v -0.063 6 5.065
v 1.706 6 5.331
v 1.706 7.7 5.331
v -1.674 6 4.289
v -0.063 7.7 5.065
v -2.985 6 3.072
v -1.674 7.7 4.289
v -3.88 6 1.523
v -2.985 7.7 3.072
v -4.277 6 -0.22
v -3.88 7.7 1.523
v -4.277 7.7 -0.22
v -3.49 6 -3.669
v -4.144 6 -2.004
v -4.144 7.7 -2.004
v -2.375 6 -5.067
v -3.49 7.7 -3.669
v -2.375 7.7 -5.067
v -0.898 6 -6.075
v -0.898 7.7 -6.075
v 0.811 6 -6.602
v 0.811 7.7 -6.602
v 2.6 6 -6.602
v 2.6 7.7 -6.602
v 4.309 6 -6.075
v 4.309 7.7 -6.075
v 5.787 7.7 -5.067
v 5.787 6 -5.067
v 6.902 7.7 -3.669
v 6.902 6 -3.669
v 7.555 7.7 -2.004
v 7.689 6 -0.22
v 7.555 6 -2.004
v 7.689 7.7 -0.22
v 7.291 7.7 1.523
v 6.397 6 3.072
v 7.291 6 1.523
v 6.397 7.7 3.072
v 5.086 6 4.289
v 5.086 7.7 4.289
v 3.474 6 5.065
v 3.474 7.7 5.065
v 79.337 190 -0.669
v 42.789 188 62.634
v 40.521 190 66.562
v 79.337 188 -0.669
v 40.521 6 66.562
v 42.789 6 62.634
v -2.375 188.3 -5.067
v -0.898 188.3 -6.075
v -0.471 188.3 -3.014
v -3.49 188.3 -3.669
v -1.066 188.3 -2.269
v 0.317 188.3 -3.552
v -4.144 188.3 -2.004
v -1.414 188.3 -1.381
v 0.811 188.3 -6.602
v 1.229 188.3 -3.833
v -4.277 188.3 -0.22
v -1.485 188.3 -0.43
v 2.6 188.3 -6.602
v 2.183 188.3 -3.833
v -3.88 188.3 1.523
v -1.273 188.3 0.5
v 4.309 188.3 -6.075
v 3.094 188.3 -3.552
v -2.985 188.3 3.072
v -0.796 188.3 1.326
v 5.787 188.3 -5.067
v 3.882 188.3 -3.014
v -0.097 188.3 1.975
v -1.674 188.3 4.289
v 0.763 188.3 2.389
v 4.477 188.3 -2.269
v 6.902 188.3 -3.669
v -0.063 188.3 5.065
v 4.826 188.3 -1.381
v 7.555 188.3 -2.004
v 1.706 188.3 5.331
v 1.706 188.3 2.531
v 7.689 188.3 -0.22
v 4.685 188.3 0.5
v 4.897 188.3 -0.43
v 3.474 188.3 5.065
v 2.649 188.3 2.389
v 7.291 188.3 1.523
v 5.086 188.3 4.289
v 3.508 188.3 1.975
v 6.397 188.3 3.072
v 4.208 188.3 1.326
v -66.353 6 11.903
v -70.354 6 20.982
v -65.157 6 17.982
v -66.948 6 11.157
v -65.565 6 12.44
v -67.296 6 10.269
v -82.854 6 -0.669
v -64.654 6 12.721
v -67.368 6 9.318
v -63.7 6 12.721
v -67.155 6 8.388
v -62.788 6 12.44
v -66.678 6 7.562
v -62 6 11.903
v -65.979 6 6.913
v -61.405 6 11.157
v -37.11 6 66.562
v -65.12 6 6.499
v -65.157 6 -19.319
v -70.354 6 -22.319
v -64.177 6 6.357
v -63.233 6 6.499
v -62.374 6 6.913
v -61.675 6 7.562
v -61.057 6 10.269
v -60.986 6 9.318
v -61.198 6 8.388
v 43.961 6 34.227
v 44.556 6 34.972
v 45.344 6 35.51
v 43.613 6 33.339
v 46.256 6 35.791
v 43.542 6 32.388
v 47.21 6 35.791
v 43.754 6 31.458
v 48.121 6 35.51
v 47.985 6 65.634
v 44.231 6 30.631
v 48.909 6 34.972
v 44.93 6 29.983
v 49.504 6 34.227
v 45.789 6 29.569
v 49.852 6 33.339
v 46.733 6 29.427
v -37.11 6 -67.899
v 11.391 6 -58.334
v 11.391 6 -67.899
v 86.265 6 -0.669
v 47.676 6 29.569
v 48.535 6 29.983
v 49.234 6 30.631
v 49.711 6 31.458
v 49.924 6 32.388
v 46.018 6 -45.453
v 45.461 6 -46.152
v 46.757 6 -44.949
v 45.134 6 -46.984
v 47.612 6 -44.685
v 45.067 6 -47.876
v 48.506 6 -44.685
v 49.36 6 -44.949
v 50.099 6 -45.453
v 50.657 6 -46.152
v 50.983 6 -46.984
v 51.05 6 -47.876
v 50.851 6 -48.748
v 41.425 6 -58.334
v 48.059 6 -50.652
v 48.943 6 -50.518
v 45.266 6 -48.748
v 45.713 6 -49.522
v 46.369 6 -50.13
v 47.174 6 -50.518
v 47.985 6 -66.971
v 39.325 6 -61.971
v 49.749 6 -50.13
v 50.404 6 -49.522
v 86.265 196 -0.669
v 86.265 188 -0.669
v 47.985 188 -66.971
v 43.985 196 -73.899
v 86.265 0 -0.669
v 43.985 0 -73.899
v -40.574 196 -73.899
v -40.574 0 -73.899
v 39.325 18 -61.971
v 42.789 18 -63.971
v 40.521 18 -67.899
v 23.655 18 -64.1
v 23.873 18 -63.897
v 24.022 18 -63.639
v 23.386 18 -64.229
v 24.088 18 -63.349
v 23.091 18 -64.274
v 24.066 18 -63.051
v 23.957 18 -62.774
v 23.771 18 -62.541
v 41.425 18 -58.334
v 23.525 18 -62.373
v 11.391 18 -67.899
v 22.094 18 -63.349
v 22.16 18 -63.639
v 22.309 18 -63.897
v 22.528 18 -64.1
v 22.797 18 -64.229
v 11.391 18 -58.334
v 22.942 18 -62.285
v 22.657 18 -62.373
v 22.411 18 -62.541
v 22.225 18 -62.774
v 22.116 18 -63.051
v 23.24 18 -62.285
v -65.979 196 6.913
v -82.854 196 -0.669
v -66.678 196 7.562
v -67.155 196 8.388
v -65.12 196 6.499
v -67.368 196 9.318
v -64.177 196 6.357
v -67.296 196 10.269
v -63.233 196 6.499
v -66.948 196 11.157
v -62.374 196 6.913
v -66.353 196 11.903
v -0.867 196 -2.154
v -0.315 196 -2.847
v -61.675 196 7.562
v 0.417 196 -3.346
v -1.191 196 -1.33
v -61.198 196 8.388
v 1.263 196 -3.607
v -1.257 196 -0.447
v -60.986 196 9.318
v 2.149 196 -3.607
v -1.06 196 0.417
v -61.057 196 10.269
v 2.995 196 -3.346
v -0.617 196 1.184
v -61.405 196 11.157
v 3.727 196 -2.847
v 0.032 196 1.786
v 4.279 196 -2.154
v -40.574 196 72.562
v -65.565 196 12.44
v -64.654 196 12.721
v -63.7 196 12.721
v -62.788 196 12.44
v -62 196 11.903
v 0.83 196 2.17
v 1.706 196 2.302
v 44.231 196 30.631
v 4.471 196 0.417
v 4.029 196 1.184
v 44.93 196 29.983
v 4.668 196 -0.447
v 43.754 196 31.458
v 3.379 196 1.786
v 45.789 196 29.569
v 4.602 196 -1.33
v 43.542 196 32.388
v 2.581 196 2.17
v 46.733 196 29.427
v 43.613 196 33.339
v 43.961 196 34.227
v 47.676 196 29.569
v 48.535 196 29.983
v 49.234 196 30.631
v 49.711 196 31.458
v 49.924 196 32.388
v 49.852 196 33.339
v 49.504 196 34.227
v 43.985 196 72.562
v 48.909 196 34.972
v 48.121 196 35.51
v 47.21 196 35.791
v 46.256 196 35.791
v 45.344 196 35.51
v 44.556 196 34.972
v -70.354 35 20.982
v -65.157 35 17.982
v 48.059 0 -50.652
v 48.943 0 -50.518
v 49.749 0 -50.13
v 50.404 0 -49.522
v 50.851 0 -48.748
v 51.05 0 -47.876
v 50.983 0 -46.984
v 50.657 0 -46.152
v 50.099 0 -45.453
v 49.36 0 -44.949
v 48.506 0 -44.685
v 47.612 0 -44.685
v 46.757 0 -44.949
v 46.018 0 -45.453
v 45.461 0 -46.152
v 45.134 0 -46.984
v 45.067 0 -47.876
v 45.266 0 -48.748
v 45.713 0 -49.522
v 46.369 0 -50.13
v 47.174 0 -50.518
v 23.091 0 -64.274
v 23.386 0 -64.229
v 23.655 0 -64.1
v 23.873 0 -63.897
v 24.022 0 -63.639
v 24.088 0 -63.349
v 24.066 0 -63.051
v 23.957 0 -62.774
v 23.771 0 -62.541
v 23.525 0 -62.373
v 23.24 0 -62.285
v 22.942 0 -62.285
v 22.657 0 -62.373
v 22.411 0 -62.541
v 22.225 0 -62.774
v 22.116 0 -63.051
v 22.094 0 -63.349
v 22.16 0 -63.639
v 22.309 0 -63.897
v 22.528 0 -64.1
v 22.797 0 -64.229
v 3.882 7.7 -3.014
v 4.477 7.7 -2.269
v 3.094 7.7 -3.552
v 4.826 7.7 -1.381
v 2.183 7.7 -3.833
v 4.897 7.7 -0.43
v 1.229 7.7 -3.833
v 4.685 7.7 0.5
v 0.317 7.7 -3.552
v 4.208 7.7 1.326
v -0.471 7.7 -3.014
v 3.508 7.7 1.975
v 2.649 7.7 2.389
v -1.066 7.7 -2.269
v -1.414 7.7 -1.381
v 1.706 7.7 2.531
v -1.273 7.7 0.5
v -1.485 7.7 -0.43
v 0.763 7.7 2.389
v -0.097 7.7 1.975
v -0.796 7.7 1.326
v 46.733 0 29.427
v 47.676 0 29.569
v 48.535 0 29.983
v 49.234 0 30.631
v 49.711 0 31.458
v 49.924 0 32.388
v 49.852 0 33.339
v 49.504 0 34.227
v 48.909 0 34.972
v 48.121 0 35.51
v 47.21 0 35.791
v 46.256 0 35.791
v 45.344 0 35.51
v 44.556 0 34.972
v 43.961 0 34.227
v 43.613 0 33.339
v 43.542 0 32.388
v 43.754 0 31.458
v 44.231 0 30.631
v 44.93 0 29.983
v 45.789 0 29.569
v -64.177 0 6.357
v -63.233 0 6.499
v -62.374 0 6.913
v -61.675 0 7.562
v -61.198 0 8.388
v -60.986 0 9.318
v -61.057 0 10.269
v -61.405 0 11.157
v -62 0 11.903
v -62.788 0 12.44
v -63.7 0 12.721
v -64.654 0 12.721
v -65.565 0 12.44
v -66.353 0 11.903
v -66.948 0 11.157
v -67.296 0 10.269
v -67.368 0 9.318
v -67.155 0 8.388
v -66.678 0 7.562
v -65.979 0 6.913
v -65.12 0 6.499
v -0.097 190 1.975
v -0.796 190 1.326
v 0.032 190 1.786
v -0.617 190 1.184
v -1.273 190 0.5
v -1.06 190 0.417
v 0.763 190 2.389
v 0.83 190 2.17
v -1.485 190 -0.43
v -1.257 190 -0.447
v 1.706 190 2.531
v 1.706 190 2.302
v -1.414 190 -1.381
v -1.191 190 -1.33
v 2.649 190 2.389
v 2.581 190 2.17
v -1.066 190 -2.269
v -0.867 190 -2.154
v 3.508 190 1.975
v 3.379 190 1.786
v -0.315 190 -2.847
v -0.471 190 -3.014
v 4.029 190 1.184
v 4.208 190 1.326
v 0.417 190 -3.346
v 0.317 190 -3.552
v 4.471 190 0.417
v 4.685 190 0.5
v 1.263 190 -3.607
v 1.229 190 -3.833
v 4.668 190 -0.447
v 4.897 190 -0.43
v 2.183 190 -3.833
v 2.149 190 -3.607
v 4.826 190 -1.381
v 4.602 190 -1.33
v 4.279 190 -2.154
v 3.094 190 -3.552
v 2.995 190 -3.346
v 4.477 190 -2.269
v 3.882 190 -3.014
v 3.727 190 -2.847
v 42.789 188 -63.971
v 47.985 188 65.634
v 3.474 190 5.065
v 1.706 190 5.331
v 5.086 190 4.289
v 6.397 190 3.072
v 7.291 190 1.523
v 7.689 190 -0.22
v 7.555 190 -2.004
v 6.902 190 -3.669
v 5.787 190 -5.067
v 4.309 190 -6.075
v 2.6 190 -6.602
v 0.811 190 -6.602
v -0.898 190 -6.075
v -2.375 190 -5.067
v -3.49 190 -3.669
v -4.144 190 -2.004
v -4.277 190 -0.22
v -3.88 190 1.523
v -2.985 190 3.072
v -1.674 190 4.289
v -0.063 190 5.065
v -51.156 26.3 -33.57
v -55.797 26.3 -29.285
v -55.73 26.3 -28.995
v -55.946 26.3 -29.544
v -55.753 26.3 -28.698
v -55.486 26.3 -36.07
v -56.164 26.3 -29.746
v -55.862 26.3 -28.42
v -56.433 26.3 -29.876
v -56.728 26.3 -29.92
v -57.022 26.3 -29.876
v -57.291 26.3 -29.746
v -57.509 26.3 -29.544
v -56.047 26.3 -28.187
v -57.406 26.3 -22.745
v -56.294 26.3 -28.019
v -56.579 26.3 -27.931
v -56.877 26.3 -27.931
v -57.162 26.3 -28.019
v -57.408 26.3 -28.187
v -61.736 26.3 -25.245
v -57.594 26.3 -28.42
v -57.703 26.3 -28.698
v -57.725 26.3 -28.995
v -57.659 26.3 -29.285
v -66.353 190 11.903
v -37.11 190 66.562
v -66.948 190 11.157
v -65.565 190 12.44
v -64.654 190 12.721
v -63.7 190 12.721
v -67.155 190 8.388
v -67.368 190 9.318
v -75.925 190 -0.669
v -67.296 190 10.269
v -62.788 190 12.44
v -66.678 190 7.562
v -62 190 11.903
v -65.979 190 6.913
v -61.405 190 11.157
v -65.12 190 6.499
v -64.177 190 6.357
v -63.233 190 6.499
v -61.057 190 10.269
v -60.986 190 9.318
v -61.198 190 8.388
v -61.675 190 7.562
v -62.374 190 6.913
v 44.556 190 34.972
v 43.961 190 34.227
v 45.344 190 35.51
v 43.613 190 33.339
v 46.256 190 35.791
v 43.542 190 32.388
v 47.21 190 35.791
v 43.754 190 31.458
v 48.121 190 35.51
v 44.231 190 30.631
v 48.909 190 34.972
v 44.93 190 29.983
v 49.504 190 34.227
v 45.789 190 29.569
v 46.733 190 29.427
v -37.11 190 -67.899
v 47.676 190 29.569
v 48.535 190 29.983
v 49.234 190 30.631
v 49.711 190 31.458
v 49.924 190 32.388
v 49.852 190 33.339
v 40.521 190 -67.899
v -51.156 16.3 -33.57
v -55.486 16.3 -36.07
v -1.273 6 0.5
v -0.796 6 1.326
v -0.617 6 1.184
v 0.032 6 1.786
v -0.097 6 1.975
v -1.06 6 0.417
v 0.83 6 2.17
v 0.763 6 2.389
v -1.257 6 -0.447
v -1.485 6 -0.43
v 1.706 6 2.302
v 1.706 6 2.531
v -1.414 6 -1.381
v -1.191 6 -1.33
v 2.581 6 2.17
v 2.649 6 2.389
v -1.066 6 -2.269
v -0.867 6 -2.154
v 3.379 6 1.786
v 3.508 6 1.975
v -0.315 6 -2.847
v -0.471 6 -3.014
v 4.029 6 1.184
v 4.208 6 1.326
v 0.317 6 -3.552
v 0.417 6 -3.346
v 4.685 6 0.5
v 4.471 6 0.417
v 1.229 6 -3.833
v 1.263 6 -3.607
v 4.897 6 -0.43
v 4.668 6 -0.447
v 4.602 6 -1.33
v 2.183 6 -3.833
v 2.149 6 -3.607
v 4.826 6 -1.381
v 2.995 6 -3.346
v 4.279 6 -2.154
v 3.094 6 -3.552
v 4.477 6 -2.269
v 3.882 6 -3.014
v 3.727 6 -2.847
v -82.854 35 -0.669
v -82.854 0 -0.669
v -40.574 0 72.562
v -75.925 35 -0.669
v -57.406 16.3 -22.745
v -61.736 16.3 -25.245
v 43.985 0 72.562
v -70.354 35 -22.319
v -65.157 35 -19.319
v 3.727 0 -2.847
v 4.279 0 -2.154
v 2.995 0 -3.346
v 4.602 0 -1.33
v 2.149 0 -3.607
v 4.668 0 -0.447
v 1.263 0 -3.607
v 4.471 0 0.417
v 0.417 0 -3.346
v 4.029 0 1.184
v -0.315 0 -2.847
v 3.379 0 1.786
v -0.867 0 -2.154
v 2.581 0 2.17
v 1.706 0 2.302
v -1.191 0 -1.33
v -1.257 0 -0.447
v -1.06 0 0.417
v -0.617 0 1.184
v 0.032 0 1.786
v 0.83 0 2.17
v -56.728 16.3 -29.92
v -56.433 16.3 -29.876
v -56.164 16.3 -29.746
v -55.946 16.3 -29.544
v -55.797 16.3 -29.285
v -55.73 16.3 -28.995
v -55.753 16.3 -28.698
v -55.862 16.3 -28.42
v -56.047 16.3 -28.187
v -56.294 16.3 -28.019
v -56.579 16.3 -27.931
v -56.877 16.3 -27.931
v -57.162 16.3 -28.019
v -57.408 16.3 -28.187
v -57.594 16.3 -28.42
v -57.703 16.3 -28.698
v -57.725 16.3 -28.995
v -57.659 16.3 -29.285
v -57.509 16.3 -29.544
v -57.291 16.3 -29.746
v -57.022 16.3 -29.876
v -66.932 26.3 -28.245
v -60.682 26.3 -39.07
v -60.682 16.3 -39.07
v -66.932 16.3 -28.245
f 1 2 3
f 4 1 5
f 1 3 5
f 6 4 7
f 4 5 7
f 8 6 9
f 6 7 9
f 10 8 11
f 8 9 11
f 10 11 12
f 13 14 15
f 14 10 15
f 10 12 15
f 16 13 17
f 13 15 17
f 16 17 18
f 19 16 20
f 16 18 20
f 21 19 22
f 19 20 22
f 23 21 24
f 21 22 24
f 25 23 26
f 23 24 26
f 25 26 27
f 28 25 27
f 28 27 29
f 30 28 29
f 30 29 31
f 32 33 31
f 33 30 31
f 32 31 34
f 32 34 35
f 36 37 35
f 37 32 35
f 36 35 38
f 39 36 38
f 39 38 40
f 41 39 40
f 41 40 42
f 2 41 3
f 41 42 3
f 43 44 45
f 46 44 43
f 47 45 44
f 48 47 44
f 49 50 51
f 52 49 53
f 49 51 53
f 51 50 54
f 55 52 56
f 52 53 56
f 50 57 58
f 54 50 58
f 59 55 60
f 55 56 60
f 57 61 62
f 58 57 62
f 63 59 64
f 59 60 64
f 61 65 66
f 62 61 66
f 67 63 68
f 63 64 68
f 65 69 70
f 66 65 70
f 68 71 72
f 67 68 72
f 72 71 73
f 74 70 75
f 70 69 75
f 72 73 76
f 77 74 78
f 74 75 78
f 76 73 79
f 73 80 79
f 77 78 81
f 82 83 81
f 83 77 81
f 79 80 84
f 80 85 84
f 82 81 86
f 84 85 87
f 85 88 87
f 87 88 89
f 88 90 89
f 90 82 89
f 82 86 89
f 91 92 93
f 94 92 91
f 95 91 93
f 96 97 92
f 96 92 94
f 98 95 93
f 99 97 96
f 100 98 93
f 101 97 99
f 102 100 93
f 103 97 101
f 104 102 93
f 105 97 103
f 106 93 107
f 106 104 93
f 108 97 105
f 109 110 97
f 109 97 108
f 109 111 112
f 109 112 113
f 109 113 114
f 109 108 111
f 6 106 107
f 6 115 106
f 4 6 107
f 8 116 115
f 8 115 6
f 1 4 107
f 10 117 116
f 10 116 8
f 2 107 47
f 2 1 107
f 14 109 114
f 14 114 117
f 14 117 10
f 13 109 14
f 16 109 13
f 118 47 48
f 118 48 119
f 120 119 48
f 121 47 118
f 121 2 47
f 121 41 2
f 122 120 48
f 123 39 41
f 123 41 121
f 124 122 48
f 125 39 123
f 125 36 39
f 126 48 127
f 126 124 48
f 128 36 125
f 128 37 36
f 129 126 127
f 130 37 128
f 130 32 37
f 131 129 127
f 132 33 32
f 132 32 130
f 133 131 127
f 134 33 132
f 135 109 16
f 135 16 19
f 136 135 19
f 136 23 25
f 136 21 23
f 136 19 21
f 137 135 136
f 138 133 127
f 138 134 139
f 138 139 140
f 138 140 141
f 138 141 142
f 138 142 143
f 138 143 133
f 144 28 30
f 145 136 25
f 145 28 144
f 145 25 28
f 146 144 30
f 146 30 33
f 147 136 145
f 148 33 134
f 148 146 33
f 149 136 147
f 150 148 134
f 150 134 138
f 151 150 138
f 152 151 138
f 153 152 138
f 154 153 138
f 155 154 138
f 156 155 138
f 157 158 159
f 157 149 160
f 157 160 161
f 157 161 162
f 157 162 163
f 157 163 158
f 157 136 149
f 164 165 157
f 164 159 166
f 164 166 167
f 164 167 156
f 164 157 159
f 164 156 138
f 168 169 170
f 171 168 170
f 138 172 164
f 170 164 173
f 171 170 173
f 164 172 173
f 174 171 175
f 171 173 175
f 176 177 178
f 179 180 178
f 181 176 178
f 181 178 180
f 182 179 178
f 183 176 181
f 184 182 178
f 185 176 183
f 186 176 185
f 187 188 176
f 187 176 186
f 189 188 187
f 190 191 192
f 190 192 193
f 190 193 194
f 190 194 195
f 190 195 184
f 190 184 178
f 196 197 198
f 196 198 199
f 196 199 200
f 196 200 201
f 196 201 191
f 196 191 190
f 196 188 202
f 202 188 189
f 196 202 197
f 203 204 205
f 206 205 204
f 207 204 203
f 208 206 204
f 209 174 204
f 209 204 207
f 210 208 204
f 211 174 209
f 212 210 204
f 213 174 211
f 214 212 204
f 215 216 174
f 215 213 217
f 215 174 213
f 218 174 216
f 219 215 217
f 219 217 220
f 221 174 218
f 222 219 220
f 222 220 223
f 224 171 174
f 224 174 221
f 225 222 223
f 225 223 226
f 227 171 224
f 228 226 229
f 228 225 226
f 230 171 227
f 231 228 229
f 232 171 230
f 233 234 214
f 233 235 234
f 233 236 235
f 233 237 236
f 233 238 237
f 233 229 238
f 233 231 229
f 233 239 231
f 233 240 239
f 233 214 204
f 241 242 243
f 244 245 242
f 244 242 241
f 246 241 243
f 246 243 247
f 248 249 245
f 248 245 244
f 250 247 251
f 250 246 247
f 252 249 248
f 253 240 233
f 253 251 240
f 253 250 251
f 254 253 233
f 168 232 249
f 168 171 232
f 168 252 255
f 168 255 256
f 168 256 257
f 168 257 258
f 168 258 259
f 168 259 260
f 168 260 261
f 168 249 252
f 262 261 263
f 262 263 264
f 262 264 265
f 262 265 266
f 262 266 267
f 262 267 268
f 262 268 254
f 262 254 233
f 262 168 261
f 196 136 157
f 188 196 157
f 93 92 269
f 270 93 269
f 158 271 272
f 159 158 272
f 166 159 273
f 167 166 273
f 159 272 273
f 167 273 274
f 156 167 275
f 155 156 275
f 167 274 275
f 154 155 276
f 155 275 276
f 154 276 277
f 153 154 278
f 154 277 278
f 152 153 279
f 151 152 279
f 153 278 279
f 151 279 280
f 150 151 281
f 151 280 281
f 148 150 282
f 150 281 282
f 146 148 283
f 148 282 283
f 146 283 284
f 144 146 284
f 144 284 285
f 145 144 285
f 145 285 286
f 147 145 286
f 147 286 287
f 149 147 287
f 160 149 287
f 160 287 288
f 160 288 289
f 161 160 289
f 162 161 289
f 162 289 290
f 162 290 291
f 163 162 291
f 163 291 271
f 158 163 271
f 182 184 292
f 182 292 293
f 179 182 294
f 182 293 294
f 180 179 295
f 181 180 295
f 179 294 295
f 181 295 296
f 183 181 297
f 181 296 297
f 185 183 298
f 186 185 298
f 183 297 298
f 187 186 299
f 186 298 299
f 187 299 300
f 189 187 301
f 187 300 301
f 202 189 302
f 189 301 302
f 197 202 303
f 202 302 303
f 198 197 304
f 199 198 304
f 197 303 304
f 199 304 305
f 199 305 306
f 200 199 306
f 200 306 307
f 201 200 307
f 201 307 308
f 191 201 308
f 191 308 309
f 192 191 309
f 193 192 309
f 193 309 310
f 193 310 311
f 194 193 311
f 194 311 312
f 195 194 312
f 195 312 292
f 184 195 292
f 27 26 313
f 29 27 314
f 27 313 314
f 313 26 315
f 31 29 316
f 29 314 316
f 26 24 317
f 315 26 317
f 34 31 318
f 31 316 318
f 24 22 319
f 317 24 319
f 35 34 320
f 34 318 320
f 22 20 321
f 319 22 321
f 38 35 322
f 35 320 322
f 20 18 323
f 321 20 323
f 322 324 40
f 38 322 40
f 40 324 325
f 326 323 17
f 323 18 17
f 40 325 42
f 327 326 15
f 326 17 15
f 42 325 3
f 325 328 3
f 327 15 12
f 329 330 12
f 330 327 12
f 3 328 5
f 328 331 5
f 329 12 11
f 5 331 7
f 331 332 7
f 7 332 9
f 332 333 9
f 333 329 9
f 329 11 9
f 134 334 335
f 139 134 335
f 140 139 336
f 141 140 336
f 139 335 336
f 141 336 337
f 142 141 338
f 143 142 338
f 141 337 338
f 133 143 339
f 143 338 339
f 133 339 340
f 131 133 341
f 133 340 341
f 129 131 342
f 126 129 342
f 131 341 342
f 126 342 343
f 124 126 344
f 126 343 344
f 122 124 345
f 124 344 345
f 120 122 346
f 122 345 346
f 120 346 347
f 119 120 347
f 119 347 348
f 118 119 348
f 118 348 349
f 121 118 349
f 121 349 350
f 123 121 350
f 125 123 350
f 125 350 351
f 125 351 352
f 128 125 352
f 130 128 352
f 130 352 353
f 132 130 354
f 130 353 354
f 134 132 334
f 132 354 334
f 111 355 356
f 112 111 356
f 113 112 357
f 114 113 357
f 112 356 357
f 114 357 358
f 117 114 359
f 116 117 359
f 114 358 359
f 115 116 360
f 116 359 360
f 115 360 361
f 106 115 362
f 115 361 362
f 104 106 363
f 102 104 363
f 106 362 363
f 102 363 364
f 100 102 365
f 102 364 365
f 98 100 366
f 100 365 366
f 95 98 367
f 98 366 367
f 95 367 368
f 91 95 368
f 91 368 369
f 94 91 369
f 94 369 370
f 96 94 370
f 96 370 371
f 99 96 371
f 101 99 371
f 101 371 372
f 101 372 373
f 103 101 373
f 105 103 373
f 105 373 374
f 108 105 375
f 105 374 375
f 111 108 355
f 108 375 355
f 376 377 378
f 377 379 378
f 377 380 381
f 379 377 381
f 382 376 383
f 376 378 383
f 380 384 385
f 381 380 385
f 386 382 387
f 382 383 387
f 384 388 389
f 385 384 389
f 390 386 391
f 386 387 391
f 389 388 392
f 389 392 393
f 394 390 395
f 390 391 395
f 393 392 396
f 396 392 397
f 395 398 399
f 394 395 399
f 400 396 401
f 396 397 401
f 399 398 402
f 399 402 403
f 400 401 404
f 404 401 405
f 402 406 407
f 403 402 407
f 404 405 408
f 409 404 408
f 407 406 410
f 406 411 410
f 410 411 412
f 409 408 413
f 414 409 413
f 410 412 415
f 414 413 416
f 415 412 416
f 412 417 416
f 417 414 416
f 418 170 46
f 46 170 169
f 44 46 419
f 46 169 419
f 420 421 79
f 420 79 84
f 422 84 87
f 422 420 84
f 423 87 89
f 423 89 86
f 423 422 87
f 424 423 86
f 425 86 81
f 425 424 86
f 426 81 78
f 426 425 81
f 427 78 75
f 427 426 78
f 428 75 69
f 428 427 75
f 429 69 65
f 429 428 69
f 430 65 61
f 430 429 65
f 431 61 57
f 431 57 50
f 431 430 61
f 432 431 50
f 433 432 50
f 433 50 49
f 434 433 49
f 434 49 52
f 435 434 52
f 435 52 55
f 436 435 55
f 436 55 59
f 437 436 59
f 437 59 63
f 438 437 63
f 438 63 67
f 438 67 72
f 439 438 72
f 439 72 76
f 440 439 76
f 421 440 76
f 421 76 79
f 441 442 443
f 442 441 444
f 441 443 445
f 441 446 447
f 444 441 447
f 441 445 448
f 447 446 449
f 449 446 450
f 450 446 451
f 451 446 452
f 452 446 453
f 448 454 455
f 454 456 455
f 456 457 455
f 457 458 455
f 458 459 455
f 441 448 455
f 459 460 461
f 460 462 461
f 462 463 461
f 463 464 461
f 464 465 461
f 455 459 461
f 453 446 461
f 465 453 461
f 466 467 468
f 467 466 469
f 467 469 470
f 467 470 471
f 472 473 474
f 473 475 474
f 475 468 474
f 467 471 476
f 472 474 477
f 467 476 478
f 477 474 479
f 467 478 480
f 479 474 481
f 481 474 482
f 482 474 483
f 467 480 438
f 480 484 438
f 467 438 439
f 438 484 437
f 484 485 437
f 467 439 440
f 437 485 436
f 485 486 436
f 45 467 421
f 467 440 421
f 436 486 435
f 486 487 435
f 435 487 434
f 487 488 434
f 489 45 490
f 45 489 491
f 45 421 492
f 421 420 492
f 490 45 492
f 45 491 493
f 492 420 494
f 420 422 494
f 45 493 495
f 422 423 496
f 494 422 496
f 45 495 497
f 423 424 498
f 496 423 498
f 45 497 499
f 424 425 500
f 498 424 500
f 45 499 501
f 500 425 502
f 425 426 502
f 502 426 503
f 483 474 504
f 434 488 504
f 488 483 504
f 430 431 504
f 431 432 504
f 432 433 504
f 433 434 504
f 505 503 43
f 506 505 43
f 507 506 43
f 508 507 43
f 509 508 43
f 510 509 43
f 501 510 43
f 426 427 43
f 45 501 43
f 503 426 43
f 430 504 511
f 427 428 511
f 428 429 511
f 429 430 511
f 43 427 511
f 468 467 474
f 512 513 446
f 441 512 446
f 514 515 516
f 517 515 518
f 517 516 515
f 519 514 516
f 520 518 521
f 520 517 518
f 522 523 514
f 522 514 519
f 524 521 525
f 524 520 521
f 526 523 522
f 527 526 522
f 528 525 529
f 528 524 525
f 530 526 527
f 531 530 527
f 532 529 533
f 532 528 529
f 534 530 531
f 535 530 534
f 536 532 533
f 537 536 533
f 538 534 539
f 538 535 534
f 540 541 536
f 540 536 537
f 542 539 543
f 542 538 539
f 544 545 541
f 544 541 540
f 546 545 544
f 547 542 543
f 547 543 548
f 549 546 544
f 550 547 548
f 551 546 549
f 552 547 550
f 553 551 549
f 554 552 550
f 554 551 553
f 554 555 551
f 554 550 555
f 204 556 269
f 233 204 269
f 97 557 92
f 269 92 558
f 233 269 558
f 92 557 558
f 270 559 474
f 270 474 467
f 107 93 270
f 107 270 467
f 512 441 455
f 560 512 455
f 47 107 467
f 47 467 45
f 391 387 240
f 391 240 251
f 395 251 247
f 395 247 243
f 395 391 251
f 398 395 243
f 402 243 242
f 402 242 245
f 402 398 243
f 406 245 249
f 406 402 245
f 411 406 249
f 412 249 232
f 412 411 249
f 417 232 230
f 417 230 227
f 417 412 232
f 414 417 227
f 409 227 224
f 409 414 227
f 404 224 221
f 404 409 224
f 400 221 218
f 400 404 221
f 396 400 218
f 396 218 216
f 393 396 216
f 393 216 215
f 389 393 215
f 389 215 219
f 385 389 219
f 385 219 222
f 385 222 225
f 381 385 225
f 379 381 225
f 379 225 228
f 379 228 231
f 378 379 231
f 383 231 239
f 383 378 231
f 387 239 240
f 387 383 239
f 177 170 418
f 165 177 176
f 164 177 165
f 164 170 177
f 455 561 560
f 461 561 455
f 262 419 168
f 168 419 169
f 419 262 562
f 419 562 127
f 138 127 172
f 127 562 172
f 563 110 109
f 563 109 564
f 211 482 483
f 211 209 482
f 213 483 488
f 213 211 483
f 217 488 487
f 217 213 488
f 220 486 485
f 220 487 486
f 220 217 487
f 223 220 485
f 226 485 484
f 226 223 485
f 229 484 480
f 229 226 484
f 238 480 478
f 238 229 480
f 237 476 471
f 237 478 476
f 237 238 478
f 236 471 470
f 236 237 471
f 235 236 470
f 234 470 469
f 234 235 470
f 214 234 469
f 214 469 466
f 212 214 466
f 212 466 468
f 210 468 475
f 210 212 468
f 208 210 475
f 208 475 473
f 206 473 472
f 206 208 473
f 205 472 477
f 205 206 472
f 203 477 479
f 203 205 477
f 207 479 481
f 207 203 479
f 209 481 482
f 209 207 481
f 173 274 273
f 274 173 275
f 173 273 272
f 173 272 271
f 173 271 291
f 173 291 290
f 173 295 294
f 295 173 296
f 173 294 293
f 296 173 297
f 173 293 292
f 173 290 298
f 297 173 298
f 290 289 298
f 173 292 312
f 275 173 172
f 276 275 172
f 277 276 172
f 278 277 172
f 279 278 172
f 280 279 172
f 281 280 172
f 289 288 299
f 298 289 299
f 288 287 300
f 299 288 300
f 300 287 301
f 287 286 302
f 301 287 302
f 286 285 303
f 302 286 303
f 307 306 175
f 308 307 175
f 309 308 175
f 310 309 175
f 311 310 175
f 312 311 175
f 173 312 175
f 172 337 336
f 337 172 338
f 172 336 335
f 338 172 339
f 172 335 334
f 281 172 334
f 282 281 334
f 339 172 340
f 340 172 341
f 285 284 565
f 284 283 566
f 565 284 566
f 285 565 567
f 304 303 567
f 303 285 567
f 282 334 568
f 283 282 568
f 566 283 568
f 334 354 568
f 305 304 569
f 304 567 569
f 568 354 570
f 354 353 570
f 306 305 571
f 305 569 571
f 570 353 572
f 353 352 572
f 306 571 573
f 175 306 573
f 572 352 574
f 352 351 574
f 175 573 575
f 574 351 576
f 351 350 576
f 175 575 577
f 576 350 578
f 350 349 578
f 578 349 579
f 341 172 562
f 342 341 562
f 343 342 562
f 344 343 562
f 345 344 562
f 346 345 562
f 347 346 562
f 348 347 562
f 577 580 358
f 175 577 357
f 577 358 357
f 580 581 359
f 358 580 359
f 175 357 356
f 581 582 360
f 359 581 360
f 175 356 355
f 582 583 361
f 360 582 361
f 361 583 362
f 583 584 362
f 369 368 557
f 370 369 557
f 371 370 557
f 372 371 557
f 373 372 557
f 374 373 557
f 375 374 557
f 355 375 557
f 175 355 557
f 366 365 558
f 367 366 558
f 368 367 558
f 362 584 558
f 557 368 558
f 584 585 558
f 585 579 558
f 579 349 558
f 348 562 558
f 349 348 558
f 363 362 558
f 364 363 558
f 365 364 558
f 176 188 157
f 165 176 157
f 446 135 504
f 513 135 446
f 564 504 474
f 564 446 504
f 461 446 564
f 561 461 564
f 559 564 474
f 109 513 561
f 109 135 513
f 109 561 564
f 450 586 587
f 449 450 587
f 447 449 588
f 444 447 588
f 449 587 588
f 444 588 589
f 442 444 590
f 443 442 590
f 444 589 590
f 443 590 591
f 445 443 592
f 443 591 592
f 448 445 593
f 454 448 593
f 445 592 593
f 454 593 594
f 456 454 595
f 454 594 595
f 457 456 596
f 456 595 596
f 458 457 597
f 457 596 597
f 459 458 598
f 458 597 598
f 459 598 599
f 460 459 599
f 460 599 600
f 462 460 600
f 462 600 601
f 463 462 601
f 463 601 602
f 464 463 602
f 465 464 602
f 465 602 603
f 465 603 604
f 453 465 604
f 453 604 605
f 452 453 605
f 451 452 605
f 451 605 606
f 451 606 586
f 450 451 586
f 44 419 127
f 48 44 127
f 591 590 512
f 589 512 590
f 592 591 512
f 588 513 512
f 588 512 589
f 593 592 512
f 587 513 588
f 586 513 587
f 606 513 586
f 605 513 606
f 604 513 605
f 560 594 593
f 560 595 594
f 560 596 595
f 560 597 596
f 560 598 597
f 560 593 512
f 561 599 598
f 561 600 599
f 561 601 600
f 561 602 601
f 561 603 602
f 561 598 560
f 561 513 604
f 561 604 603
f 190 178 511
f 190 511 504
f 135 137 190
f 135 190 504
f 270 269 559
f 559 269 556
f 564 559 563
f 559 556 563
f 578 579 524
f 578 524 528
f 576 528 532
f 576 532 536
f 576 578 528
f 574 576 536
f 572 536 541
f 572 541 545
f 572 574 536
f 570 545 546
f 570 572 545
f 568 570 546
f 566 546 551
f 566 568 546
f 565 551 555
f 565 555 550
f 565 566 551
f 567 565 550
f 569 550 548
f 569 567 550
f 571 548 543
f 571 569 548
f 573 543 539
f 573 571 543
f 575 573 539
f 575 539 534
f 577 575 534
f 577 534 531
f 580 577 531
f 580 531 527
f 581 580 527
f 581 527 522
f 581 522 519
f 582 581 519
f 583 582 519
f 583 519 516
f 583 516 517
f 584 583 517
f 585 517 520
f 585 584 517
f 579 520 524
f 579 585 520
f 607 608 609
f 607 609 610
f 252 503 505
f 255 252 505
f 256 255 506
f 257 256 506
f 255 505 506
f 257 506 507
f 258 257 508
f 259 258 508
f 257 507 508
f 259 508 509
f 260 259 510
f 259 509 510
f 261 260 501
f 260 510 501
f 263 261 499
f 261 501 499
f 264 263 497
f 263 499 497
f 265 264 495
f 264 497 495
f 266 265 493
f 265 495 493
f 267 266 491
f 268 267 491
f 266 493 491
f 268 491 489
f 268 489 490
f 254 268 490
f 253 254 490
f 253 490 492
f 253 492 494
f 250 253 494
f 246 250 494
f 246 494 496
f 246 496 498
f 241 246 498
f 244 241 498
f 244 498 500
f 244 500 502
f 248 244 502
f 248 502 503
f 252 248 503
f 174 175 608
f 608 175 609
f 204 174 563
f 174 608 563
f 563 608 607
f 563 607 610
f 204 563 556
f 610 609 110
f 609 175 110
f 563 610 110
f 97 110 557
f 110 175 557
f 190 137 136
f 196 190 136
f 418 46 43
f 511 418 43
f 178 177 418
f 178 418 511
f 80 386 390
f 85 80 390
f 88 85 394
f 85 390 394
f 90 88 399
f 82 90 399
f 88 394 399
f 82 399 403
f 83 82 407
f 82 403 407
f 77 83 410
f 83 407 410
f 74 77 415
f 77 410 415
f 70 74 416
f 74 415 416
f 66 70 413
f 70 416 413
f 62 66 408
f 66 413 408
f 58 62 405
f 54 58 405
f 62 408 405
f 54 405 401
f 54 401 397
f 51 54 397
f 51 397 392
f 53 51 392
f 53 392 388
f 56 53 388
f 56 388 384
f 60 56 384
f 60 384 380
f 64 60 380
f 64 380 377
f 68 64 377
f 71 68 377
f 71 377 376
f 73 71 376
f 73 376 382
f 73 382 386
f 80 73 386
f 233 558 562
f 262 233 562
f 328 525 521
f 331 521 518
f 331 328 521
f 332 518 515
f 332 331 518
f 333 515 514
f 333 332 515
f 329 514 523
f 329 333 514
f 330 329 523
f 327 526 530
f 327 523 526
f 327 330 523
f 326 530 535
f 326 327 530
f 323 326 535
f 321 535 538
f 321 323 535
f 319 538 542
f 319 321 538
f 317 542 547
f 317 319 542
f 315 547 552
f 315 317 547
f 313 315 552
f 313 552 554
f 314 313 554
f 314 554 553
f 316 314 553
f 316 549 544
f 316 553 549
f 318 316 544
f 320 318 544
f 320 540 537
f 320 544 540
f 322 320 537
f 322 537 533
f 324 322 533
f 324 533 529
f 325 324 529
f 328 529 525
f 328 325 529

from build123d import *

# Parameters (mm, degrees)
SKETCH1_R                = 2.971068709
BOSS_EXTRUDE2_DEPTH      = 6
BOSS_EXTRUDE3_DEPTH      = 190
SKETCH3_R                = 2.971068709
BOSS_EXTRUDE5_DEPTH      = 6
SKETCH4_W                = 12.5
SKETCH4_H                = 10
BOSS_EXTRUDE6_DEPTH      = 11
SKETCH5_R                = 1
BOSS_EXTRUDE8_DEPTH      = 18
SKETCH5_2_R              = 1
CUT_EXTRUDE2_DEPTH       = 18
SKETCH7_R                = 6
SKETCH7_R_2              = 3.2
BOSS_EXTRUDE9_DEPTH      = 7.7
BOSS_EXTRUDE10_START     = -7.7
SKETCH8_R                = 6
SKETCH8_R_2              = 3.2
BOSS_EXTRUDE10_DEPTH     = 7.7
SKETCH9_W                = 182
SKETCH9_H                = 76.559305207
CUT_EXTRUDE3_DEPTH       = 6
SKETCH11_W               = 29
SKETCH11_H               = 25
CUT_EXTRUDE5_DEPTH       = 6
SKETCH12_W               = 29
SKETCH12_H               = 25
CUT_EXTRUDE6_DEPTH       = 6
SKETCH13_R               = 3.2
SKETCH13_R_2             = 3
CUT_EXTRUDE7_DEPTH       = 6
SKETCH14_R               = 3.2
CUT_EXTRUDE8_DEPTH       = 1273.798581799
SKETCH15_R               = 1
CUT_EXTRUDE9_DEPTH       = 11
SKETCH17_R               = 3
CUT_EXTRUDE11_DEPTH      = 170
CUT_EXTRUDE13_DEPTH      = 1271.151262578
CUT_EXTRUDE13_DEPTH_BACK = 1271.151262578
SKETCH19_R               = 3.2
SKETCH20_W               = 182
SKETCH20_H               = 76.559305207
CUT_EXTRUDE14_DEPTH      = 10


with BuildPart() as part:
    # Sketch1 → Boss-Extrude2 (new body)
    with BuildSketch(Plane(origin=(0, 0, 0), x_dir=(1, 0, 0), z_dir=(0, 1, 0))):
        Polygon((-40.573914373, 73.899203379), (-82.853566976, 0.668696943), (-40.573914373, -72.561809493), (43.985390835, -72.561809493), (86.265043438, 0.668696943), (43.985390835, 73.899203379), align=None)
        with Locations(Location((1.705738231, 0.668696943, 0), (0, 0, 270))):
            Circle(SKETCH1_R, mode=Mode.SUBTRACT)
    extrude(amount=BOSS_EXTRUDE2_DEPTH)

    # Sketch1<3> → Boss-Extrude3 (add)
    with BuildSketch(Plane(origin=(0, 0, 0), x_dir=(1, 0, 0), z_dir=(0, 1, 0))):
        Polygon((86.265043438, 0.668696943), (43.985390835, 73.899203379), (-40.573914373, 73.899203379), (-82.853566976, 0.668696943), (-40.573914373, -72.561809493), (43.985390835, -72.561809493), align=None)
        Polygon((-37.109812757, 67.899203379), (-75.925363746, 0.668696943), (-37.109812757, -66.561809493), (40.521289219, -66.561809493), (79.336840208, 0.668696943), (40.521289219, 67.899203379), align=None, mode=Mode.SUBTRACT)
    extrude(amount=BOSS_EXTRUDE3_DEPTH)

    # Sketch3 → Boss-Extrude5 (add)
    with BuildSketch(Plane(origin=(0, 190, 0), x_dir=(1, 0, 0), z_dir=(0, 1, 0))):
        Polygon((86.265043438, 0.668696943), (43.985390835, 73.899203379), (-40.573914373, 73.899203379), (-82.853566976, 0.668696943), (-40.573914373, -72.561809493), (43.985390835, -72.561809493), align=None)
        with Locations(Location((1.705738231, 0.668696943, 0), (0, 0, 270))):
            Circle(SKETCH3_R, mode=Mode.SUBTRACT)
    extrude(amount=BOSS_EXTRUDE5_DEPTH)

    # Sketch4 → Boss-Extrude6 (add)
    with BuildSketch(Plane(origin=(-62.429729502, 0, -36.043821133), x_dir=(-0.5000000000000001, 0, 0.8660254037844386), z_dir=(-0.8660254037844386, 0, -0.5000000000000001))):
        with Locations((2.755177243, 21.3)):
            Rectangle(SKETCH4_W, SKETCH4_H)
    extrude(amount=-BOSS_EXTRUDE6_DEPTH)

    # Sketch5 → Boss-Extrude8 (add)
    with BuildSketch(Plane.XZ):
        Polygon((40.521289219, -67.899203379), (11.391049027, -67.899203379), (11.391049027, -58.334458752), (46.043497104, -58.334458752), align=None)
        with Locations(Location((23.091264622, -63.273901871, 0), (0, 0, 270))):
            Circle(SKETCH5_R, mode=Mode.SUBTRACT)
    extrude(amount=-BOSS_EXTRUDE8_DEPTH)

    # Sketch5<2> → Cut-Extrude2 (cut)
    with BuildSketch(Plane.XZ):
        with Locations(Location((23.091264622, -63.273901871, 0), (0, 0, 270))):
            Circle(SKETCH5_2_R)
    extrude(amount=-CUT_EXTRUDE2_DEPTH, mode=Mode.SUBTRACT)

    # Sketch7 → Boss-Extrude9 (add)
    with BuildSketch(Plane(origin=(0, 196, 0), x_dir=(1, 0, 0), z_dir=(0, 1, 0))):
        with Locations(Location((1.705738231, 0.668696943, 0), (0, 0, 270))):
            Circle(SKETCH7_R)
        with Locations(Location((1.705738231, 0.668696943, 0), (0, 0, 270))):
            Circle(SKETCH7_R_2, mode=Mode.SUBTRACT)
    extrude(amount=-BOSS_EXTRUDE9_DEPTH)

    # Sketch8 → Boss-Extrude10 (add)
    with BuildSketch(Plane.XZ.offset(BOSS_EXTRUDE10_START)):
        with Locations(Location((1.705738231, -0.668696943, 0), (0, 0, 90))):
            Circle(SKETCH8_R)
        with Locations(Location((1.705738231, -0.668696943, 0), (0, 0, 90))):
            Circle(SKETCH8_R_2, mode=Mode.SUBTRACT)
    extrude(amount=BOSS_EXTRUDE10_DEPTH)

    # Sketch9 → Cut-Extrude3 (cut)
    with BuildSketch(Plane(origin=(629.826957164, 1366.496608068, -942.145548576), x_dir=(0, -1, 0), z_dir=(-0.8660254037844386, 0, -0.5000000000000003))):
        with Locations((1269.496608068, 1125.403480057)):
            Rectangle(SKETCH9_W, SKETCH9_H)
    extrude(amount=CUT_EXTRUDE3_DEPTH, mode=Mode.SUBTRACT)

    # Sketch11 → Cut-Extrude5 (cut)
    with BuildSketch(Plane(origin=(508.18415178, 1366.496608068, 1023.038661132), x_dir=(0, 1, 0), z_dir=(-0.8660254037844386, 0, 0.5000000000000001))):
        with Locations((-1345.996608068, 1169.575437511)):
            Rectangle(SKETCH11_W, SKETCH11_H)
    extrude(amount=-CUT_EXTRUDE5_DEPTH, mode=Mode.SUBTRACT)

    # Sketch12 → Cut-Extrude6 (cut)
    with BuildSketch(Plane(origin=(-287.090468893, 1366.496608068, 353.079993957), x_dir=(0, 1, 0), z_dir=(-0.8660254037844386, 0, -0.5000000000000001))):
        with Locations((-1345.996608068, 420.973803834)):
            Rectangle(SKETCH12_W, SKETCH12_H)
    extrude(amount=-CUT_EXTRUDE6_DEPTH, mode=Mode.SUBTRACT)

    # Sketch13 → Cut-Extrude7 (cut)
    with BuildSketch(Plane(origin=(690.748066702, 0, 917.635335707), x_dir=(-1, 0, 0), z_dir=(0, -1, 0))):
        with Locations(Location((754.924695238, 908.078431268, 0), (0, 0, 90))):
            Circle(SKETCH13_R)
        with Locations(Location((644.015452413, 885.008681135, 0), (0, 0, 90))):
            Circle(SKETCH13_R)
        with Locations(Location((642.689368477, 965.287041279, 0), (0, 0, 90))):
            Circle(SKETCH13_R_2)
    extrude(amount=-CUT_EXTRUDE7_DEPTH, mode=Mode.SUBTRACT)

    # Sketch14 → Cut-Extrude8 (cut, through all)
    with BuildSketch(Plane(origin=(690.748066702, 0, 917.635335707), x_dir=(-1, 0, 0), z_dir=(0, -1, 0))):
        with Locations(Location((644.015452413, 885.008681135, 0), (0, 0, 90))):
            Circle(SKETCH14_R)
    extrude(amount=-CUT_EXTRUDE8_DEPTH, mode=Mode.SUBTRACT)

    # Sketch15 → Cut-Extrude9 (cut)
    with BuildSketch(Plane(origin=(690.748066702, 16.3, 917.635335707), x_dir=(-1, 0, 0), z_dir=(0, -1, 0))):
        with Locations(Location((747.475715997, 946.555449467, 0), (0, 0, 90))):
            Circle(SKETCH15_R)
    extrude(amount=-CUT_EXTRUDE9_DEPTH, mode=Mode.SUBTRACT)

    # Sketch17 → Cut-Extrude11 (cut)
    with BuildSketch(Plane(origin=(690.748066702, 198, 917.635335707), x_dir=(1, 0, 0), z_dir=(0, 1, 0))):
        with Locations(Location((-754.924695238, 908.078431268, 0), (0, 0, 270))):
            Circle(SKETCH17_R)
    extrude(amount=-CUT_EXTRUDE11_DEPTH, mode=Mode.SUBTRACT)

    # Sketch19 → Cut-Extrude13 (cut, two sides: drawn at the far end of the back side and taken through both)
    with BuildSketch(Plane(origin=(690.748066702, 18, 917.635335707), x_dir=(-1, 0, 0), z_dir=(0, -1, 0)).offset(-CUT_EXTRUDE13_DEPTH_BACK)):
        with Locations(Location((754.924695238, 908.078431268, 0), (0, 0, 90))):
            Circle(SKETCH19_R)
    extrude(amount=CUT_EXTRUDE13_DEPTH + CUT_EXTRUDE13_DEPTH_BACK, mode=Mode.SUBTRACT)

    # Sketch20 → Cut-Extrude14 (cut)
    with BuildSketch(Plane(origin=(-165.447663504, 1366.496608068, -436.647894277), x_dir=(0, -1, 0), z_dir=(-0.8660254037844385, 0, 0.5000000000000002))):
        with Locations((1269.496608068, 465.14576128)):
            Rectangle(SKETCH20_W, SKETCH20_H)
    extrude(amount=CUT_EXTRUDE14_DEPTH, mode=Mode.SUBTRACT)


solid = part.part
